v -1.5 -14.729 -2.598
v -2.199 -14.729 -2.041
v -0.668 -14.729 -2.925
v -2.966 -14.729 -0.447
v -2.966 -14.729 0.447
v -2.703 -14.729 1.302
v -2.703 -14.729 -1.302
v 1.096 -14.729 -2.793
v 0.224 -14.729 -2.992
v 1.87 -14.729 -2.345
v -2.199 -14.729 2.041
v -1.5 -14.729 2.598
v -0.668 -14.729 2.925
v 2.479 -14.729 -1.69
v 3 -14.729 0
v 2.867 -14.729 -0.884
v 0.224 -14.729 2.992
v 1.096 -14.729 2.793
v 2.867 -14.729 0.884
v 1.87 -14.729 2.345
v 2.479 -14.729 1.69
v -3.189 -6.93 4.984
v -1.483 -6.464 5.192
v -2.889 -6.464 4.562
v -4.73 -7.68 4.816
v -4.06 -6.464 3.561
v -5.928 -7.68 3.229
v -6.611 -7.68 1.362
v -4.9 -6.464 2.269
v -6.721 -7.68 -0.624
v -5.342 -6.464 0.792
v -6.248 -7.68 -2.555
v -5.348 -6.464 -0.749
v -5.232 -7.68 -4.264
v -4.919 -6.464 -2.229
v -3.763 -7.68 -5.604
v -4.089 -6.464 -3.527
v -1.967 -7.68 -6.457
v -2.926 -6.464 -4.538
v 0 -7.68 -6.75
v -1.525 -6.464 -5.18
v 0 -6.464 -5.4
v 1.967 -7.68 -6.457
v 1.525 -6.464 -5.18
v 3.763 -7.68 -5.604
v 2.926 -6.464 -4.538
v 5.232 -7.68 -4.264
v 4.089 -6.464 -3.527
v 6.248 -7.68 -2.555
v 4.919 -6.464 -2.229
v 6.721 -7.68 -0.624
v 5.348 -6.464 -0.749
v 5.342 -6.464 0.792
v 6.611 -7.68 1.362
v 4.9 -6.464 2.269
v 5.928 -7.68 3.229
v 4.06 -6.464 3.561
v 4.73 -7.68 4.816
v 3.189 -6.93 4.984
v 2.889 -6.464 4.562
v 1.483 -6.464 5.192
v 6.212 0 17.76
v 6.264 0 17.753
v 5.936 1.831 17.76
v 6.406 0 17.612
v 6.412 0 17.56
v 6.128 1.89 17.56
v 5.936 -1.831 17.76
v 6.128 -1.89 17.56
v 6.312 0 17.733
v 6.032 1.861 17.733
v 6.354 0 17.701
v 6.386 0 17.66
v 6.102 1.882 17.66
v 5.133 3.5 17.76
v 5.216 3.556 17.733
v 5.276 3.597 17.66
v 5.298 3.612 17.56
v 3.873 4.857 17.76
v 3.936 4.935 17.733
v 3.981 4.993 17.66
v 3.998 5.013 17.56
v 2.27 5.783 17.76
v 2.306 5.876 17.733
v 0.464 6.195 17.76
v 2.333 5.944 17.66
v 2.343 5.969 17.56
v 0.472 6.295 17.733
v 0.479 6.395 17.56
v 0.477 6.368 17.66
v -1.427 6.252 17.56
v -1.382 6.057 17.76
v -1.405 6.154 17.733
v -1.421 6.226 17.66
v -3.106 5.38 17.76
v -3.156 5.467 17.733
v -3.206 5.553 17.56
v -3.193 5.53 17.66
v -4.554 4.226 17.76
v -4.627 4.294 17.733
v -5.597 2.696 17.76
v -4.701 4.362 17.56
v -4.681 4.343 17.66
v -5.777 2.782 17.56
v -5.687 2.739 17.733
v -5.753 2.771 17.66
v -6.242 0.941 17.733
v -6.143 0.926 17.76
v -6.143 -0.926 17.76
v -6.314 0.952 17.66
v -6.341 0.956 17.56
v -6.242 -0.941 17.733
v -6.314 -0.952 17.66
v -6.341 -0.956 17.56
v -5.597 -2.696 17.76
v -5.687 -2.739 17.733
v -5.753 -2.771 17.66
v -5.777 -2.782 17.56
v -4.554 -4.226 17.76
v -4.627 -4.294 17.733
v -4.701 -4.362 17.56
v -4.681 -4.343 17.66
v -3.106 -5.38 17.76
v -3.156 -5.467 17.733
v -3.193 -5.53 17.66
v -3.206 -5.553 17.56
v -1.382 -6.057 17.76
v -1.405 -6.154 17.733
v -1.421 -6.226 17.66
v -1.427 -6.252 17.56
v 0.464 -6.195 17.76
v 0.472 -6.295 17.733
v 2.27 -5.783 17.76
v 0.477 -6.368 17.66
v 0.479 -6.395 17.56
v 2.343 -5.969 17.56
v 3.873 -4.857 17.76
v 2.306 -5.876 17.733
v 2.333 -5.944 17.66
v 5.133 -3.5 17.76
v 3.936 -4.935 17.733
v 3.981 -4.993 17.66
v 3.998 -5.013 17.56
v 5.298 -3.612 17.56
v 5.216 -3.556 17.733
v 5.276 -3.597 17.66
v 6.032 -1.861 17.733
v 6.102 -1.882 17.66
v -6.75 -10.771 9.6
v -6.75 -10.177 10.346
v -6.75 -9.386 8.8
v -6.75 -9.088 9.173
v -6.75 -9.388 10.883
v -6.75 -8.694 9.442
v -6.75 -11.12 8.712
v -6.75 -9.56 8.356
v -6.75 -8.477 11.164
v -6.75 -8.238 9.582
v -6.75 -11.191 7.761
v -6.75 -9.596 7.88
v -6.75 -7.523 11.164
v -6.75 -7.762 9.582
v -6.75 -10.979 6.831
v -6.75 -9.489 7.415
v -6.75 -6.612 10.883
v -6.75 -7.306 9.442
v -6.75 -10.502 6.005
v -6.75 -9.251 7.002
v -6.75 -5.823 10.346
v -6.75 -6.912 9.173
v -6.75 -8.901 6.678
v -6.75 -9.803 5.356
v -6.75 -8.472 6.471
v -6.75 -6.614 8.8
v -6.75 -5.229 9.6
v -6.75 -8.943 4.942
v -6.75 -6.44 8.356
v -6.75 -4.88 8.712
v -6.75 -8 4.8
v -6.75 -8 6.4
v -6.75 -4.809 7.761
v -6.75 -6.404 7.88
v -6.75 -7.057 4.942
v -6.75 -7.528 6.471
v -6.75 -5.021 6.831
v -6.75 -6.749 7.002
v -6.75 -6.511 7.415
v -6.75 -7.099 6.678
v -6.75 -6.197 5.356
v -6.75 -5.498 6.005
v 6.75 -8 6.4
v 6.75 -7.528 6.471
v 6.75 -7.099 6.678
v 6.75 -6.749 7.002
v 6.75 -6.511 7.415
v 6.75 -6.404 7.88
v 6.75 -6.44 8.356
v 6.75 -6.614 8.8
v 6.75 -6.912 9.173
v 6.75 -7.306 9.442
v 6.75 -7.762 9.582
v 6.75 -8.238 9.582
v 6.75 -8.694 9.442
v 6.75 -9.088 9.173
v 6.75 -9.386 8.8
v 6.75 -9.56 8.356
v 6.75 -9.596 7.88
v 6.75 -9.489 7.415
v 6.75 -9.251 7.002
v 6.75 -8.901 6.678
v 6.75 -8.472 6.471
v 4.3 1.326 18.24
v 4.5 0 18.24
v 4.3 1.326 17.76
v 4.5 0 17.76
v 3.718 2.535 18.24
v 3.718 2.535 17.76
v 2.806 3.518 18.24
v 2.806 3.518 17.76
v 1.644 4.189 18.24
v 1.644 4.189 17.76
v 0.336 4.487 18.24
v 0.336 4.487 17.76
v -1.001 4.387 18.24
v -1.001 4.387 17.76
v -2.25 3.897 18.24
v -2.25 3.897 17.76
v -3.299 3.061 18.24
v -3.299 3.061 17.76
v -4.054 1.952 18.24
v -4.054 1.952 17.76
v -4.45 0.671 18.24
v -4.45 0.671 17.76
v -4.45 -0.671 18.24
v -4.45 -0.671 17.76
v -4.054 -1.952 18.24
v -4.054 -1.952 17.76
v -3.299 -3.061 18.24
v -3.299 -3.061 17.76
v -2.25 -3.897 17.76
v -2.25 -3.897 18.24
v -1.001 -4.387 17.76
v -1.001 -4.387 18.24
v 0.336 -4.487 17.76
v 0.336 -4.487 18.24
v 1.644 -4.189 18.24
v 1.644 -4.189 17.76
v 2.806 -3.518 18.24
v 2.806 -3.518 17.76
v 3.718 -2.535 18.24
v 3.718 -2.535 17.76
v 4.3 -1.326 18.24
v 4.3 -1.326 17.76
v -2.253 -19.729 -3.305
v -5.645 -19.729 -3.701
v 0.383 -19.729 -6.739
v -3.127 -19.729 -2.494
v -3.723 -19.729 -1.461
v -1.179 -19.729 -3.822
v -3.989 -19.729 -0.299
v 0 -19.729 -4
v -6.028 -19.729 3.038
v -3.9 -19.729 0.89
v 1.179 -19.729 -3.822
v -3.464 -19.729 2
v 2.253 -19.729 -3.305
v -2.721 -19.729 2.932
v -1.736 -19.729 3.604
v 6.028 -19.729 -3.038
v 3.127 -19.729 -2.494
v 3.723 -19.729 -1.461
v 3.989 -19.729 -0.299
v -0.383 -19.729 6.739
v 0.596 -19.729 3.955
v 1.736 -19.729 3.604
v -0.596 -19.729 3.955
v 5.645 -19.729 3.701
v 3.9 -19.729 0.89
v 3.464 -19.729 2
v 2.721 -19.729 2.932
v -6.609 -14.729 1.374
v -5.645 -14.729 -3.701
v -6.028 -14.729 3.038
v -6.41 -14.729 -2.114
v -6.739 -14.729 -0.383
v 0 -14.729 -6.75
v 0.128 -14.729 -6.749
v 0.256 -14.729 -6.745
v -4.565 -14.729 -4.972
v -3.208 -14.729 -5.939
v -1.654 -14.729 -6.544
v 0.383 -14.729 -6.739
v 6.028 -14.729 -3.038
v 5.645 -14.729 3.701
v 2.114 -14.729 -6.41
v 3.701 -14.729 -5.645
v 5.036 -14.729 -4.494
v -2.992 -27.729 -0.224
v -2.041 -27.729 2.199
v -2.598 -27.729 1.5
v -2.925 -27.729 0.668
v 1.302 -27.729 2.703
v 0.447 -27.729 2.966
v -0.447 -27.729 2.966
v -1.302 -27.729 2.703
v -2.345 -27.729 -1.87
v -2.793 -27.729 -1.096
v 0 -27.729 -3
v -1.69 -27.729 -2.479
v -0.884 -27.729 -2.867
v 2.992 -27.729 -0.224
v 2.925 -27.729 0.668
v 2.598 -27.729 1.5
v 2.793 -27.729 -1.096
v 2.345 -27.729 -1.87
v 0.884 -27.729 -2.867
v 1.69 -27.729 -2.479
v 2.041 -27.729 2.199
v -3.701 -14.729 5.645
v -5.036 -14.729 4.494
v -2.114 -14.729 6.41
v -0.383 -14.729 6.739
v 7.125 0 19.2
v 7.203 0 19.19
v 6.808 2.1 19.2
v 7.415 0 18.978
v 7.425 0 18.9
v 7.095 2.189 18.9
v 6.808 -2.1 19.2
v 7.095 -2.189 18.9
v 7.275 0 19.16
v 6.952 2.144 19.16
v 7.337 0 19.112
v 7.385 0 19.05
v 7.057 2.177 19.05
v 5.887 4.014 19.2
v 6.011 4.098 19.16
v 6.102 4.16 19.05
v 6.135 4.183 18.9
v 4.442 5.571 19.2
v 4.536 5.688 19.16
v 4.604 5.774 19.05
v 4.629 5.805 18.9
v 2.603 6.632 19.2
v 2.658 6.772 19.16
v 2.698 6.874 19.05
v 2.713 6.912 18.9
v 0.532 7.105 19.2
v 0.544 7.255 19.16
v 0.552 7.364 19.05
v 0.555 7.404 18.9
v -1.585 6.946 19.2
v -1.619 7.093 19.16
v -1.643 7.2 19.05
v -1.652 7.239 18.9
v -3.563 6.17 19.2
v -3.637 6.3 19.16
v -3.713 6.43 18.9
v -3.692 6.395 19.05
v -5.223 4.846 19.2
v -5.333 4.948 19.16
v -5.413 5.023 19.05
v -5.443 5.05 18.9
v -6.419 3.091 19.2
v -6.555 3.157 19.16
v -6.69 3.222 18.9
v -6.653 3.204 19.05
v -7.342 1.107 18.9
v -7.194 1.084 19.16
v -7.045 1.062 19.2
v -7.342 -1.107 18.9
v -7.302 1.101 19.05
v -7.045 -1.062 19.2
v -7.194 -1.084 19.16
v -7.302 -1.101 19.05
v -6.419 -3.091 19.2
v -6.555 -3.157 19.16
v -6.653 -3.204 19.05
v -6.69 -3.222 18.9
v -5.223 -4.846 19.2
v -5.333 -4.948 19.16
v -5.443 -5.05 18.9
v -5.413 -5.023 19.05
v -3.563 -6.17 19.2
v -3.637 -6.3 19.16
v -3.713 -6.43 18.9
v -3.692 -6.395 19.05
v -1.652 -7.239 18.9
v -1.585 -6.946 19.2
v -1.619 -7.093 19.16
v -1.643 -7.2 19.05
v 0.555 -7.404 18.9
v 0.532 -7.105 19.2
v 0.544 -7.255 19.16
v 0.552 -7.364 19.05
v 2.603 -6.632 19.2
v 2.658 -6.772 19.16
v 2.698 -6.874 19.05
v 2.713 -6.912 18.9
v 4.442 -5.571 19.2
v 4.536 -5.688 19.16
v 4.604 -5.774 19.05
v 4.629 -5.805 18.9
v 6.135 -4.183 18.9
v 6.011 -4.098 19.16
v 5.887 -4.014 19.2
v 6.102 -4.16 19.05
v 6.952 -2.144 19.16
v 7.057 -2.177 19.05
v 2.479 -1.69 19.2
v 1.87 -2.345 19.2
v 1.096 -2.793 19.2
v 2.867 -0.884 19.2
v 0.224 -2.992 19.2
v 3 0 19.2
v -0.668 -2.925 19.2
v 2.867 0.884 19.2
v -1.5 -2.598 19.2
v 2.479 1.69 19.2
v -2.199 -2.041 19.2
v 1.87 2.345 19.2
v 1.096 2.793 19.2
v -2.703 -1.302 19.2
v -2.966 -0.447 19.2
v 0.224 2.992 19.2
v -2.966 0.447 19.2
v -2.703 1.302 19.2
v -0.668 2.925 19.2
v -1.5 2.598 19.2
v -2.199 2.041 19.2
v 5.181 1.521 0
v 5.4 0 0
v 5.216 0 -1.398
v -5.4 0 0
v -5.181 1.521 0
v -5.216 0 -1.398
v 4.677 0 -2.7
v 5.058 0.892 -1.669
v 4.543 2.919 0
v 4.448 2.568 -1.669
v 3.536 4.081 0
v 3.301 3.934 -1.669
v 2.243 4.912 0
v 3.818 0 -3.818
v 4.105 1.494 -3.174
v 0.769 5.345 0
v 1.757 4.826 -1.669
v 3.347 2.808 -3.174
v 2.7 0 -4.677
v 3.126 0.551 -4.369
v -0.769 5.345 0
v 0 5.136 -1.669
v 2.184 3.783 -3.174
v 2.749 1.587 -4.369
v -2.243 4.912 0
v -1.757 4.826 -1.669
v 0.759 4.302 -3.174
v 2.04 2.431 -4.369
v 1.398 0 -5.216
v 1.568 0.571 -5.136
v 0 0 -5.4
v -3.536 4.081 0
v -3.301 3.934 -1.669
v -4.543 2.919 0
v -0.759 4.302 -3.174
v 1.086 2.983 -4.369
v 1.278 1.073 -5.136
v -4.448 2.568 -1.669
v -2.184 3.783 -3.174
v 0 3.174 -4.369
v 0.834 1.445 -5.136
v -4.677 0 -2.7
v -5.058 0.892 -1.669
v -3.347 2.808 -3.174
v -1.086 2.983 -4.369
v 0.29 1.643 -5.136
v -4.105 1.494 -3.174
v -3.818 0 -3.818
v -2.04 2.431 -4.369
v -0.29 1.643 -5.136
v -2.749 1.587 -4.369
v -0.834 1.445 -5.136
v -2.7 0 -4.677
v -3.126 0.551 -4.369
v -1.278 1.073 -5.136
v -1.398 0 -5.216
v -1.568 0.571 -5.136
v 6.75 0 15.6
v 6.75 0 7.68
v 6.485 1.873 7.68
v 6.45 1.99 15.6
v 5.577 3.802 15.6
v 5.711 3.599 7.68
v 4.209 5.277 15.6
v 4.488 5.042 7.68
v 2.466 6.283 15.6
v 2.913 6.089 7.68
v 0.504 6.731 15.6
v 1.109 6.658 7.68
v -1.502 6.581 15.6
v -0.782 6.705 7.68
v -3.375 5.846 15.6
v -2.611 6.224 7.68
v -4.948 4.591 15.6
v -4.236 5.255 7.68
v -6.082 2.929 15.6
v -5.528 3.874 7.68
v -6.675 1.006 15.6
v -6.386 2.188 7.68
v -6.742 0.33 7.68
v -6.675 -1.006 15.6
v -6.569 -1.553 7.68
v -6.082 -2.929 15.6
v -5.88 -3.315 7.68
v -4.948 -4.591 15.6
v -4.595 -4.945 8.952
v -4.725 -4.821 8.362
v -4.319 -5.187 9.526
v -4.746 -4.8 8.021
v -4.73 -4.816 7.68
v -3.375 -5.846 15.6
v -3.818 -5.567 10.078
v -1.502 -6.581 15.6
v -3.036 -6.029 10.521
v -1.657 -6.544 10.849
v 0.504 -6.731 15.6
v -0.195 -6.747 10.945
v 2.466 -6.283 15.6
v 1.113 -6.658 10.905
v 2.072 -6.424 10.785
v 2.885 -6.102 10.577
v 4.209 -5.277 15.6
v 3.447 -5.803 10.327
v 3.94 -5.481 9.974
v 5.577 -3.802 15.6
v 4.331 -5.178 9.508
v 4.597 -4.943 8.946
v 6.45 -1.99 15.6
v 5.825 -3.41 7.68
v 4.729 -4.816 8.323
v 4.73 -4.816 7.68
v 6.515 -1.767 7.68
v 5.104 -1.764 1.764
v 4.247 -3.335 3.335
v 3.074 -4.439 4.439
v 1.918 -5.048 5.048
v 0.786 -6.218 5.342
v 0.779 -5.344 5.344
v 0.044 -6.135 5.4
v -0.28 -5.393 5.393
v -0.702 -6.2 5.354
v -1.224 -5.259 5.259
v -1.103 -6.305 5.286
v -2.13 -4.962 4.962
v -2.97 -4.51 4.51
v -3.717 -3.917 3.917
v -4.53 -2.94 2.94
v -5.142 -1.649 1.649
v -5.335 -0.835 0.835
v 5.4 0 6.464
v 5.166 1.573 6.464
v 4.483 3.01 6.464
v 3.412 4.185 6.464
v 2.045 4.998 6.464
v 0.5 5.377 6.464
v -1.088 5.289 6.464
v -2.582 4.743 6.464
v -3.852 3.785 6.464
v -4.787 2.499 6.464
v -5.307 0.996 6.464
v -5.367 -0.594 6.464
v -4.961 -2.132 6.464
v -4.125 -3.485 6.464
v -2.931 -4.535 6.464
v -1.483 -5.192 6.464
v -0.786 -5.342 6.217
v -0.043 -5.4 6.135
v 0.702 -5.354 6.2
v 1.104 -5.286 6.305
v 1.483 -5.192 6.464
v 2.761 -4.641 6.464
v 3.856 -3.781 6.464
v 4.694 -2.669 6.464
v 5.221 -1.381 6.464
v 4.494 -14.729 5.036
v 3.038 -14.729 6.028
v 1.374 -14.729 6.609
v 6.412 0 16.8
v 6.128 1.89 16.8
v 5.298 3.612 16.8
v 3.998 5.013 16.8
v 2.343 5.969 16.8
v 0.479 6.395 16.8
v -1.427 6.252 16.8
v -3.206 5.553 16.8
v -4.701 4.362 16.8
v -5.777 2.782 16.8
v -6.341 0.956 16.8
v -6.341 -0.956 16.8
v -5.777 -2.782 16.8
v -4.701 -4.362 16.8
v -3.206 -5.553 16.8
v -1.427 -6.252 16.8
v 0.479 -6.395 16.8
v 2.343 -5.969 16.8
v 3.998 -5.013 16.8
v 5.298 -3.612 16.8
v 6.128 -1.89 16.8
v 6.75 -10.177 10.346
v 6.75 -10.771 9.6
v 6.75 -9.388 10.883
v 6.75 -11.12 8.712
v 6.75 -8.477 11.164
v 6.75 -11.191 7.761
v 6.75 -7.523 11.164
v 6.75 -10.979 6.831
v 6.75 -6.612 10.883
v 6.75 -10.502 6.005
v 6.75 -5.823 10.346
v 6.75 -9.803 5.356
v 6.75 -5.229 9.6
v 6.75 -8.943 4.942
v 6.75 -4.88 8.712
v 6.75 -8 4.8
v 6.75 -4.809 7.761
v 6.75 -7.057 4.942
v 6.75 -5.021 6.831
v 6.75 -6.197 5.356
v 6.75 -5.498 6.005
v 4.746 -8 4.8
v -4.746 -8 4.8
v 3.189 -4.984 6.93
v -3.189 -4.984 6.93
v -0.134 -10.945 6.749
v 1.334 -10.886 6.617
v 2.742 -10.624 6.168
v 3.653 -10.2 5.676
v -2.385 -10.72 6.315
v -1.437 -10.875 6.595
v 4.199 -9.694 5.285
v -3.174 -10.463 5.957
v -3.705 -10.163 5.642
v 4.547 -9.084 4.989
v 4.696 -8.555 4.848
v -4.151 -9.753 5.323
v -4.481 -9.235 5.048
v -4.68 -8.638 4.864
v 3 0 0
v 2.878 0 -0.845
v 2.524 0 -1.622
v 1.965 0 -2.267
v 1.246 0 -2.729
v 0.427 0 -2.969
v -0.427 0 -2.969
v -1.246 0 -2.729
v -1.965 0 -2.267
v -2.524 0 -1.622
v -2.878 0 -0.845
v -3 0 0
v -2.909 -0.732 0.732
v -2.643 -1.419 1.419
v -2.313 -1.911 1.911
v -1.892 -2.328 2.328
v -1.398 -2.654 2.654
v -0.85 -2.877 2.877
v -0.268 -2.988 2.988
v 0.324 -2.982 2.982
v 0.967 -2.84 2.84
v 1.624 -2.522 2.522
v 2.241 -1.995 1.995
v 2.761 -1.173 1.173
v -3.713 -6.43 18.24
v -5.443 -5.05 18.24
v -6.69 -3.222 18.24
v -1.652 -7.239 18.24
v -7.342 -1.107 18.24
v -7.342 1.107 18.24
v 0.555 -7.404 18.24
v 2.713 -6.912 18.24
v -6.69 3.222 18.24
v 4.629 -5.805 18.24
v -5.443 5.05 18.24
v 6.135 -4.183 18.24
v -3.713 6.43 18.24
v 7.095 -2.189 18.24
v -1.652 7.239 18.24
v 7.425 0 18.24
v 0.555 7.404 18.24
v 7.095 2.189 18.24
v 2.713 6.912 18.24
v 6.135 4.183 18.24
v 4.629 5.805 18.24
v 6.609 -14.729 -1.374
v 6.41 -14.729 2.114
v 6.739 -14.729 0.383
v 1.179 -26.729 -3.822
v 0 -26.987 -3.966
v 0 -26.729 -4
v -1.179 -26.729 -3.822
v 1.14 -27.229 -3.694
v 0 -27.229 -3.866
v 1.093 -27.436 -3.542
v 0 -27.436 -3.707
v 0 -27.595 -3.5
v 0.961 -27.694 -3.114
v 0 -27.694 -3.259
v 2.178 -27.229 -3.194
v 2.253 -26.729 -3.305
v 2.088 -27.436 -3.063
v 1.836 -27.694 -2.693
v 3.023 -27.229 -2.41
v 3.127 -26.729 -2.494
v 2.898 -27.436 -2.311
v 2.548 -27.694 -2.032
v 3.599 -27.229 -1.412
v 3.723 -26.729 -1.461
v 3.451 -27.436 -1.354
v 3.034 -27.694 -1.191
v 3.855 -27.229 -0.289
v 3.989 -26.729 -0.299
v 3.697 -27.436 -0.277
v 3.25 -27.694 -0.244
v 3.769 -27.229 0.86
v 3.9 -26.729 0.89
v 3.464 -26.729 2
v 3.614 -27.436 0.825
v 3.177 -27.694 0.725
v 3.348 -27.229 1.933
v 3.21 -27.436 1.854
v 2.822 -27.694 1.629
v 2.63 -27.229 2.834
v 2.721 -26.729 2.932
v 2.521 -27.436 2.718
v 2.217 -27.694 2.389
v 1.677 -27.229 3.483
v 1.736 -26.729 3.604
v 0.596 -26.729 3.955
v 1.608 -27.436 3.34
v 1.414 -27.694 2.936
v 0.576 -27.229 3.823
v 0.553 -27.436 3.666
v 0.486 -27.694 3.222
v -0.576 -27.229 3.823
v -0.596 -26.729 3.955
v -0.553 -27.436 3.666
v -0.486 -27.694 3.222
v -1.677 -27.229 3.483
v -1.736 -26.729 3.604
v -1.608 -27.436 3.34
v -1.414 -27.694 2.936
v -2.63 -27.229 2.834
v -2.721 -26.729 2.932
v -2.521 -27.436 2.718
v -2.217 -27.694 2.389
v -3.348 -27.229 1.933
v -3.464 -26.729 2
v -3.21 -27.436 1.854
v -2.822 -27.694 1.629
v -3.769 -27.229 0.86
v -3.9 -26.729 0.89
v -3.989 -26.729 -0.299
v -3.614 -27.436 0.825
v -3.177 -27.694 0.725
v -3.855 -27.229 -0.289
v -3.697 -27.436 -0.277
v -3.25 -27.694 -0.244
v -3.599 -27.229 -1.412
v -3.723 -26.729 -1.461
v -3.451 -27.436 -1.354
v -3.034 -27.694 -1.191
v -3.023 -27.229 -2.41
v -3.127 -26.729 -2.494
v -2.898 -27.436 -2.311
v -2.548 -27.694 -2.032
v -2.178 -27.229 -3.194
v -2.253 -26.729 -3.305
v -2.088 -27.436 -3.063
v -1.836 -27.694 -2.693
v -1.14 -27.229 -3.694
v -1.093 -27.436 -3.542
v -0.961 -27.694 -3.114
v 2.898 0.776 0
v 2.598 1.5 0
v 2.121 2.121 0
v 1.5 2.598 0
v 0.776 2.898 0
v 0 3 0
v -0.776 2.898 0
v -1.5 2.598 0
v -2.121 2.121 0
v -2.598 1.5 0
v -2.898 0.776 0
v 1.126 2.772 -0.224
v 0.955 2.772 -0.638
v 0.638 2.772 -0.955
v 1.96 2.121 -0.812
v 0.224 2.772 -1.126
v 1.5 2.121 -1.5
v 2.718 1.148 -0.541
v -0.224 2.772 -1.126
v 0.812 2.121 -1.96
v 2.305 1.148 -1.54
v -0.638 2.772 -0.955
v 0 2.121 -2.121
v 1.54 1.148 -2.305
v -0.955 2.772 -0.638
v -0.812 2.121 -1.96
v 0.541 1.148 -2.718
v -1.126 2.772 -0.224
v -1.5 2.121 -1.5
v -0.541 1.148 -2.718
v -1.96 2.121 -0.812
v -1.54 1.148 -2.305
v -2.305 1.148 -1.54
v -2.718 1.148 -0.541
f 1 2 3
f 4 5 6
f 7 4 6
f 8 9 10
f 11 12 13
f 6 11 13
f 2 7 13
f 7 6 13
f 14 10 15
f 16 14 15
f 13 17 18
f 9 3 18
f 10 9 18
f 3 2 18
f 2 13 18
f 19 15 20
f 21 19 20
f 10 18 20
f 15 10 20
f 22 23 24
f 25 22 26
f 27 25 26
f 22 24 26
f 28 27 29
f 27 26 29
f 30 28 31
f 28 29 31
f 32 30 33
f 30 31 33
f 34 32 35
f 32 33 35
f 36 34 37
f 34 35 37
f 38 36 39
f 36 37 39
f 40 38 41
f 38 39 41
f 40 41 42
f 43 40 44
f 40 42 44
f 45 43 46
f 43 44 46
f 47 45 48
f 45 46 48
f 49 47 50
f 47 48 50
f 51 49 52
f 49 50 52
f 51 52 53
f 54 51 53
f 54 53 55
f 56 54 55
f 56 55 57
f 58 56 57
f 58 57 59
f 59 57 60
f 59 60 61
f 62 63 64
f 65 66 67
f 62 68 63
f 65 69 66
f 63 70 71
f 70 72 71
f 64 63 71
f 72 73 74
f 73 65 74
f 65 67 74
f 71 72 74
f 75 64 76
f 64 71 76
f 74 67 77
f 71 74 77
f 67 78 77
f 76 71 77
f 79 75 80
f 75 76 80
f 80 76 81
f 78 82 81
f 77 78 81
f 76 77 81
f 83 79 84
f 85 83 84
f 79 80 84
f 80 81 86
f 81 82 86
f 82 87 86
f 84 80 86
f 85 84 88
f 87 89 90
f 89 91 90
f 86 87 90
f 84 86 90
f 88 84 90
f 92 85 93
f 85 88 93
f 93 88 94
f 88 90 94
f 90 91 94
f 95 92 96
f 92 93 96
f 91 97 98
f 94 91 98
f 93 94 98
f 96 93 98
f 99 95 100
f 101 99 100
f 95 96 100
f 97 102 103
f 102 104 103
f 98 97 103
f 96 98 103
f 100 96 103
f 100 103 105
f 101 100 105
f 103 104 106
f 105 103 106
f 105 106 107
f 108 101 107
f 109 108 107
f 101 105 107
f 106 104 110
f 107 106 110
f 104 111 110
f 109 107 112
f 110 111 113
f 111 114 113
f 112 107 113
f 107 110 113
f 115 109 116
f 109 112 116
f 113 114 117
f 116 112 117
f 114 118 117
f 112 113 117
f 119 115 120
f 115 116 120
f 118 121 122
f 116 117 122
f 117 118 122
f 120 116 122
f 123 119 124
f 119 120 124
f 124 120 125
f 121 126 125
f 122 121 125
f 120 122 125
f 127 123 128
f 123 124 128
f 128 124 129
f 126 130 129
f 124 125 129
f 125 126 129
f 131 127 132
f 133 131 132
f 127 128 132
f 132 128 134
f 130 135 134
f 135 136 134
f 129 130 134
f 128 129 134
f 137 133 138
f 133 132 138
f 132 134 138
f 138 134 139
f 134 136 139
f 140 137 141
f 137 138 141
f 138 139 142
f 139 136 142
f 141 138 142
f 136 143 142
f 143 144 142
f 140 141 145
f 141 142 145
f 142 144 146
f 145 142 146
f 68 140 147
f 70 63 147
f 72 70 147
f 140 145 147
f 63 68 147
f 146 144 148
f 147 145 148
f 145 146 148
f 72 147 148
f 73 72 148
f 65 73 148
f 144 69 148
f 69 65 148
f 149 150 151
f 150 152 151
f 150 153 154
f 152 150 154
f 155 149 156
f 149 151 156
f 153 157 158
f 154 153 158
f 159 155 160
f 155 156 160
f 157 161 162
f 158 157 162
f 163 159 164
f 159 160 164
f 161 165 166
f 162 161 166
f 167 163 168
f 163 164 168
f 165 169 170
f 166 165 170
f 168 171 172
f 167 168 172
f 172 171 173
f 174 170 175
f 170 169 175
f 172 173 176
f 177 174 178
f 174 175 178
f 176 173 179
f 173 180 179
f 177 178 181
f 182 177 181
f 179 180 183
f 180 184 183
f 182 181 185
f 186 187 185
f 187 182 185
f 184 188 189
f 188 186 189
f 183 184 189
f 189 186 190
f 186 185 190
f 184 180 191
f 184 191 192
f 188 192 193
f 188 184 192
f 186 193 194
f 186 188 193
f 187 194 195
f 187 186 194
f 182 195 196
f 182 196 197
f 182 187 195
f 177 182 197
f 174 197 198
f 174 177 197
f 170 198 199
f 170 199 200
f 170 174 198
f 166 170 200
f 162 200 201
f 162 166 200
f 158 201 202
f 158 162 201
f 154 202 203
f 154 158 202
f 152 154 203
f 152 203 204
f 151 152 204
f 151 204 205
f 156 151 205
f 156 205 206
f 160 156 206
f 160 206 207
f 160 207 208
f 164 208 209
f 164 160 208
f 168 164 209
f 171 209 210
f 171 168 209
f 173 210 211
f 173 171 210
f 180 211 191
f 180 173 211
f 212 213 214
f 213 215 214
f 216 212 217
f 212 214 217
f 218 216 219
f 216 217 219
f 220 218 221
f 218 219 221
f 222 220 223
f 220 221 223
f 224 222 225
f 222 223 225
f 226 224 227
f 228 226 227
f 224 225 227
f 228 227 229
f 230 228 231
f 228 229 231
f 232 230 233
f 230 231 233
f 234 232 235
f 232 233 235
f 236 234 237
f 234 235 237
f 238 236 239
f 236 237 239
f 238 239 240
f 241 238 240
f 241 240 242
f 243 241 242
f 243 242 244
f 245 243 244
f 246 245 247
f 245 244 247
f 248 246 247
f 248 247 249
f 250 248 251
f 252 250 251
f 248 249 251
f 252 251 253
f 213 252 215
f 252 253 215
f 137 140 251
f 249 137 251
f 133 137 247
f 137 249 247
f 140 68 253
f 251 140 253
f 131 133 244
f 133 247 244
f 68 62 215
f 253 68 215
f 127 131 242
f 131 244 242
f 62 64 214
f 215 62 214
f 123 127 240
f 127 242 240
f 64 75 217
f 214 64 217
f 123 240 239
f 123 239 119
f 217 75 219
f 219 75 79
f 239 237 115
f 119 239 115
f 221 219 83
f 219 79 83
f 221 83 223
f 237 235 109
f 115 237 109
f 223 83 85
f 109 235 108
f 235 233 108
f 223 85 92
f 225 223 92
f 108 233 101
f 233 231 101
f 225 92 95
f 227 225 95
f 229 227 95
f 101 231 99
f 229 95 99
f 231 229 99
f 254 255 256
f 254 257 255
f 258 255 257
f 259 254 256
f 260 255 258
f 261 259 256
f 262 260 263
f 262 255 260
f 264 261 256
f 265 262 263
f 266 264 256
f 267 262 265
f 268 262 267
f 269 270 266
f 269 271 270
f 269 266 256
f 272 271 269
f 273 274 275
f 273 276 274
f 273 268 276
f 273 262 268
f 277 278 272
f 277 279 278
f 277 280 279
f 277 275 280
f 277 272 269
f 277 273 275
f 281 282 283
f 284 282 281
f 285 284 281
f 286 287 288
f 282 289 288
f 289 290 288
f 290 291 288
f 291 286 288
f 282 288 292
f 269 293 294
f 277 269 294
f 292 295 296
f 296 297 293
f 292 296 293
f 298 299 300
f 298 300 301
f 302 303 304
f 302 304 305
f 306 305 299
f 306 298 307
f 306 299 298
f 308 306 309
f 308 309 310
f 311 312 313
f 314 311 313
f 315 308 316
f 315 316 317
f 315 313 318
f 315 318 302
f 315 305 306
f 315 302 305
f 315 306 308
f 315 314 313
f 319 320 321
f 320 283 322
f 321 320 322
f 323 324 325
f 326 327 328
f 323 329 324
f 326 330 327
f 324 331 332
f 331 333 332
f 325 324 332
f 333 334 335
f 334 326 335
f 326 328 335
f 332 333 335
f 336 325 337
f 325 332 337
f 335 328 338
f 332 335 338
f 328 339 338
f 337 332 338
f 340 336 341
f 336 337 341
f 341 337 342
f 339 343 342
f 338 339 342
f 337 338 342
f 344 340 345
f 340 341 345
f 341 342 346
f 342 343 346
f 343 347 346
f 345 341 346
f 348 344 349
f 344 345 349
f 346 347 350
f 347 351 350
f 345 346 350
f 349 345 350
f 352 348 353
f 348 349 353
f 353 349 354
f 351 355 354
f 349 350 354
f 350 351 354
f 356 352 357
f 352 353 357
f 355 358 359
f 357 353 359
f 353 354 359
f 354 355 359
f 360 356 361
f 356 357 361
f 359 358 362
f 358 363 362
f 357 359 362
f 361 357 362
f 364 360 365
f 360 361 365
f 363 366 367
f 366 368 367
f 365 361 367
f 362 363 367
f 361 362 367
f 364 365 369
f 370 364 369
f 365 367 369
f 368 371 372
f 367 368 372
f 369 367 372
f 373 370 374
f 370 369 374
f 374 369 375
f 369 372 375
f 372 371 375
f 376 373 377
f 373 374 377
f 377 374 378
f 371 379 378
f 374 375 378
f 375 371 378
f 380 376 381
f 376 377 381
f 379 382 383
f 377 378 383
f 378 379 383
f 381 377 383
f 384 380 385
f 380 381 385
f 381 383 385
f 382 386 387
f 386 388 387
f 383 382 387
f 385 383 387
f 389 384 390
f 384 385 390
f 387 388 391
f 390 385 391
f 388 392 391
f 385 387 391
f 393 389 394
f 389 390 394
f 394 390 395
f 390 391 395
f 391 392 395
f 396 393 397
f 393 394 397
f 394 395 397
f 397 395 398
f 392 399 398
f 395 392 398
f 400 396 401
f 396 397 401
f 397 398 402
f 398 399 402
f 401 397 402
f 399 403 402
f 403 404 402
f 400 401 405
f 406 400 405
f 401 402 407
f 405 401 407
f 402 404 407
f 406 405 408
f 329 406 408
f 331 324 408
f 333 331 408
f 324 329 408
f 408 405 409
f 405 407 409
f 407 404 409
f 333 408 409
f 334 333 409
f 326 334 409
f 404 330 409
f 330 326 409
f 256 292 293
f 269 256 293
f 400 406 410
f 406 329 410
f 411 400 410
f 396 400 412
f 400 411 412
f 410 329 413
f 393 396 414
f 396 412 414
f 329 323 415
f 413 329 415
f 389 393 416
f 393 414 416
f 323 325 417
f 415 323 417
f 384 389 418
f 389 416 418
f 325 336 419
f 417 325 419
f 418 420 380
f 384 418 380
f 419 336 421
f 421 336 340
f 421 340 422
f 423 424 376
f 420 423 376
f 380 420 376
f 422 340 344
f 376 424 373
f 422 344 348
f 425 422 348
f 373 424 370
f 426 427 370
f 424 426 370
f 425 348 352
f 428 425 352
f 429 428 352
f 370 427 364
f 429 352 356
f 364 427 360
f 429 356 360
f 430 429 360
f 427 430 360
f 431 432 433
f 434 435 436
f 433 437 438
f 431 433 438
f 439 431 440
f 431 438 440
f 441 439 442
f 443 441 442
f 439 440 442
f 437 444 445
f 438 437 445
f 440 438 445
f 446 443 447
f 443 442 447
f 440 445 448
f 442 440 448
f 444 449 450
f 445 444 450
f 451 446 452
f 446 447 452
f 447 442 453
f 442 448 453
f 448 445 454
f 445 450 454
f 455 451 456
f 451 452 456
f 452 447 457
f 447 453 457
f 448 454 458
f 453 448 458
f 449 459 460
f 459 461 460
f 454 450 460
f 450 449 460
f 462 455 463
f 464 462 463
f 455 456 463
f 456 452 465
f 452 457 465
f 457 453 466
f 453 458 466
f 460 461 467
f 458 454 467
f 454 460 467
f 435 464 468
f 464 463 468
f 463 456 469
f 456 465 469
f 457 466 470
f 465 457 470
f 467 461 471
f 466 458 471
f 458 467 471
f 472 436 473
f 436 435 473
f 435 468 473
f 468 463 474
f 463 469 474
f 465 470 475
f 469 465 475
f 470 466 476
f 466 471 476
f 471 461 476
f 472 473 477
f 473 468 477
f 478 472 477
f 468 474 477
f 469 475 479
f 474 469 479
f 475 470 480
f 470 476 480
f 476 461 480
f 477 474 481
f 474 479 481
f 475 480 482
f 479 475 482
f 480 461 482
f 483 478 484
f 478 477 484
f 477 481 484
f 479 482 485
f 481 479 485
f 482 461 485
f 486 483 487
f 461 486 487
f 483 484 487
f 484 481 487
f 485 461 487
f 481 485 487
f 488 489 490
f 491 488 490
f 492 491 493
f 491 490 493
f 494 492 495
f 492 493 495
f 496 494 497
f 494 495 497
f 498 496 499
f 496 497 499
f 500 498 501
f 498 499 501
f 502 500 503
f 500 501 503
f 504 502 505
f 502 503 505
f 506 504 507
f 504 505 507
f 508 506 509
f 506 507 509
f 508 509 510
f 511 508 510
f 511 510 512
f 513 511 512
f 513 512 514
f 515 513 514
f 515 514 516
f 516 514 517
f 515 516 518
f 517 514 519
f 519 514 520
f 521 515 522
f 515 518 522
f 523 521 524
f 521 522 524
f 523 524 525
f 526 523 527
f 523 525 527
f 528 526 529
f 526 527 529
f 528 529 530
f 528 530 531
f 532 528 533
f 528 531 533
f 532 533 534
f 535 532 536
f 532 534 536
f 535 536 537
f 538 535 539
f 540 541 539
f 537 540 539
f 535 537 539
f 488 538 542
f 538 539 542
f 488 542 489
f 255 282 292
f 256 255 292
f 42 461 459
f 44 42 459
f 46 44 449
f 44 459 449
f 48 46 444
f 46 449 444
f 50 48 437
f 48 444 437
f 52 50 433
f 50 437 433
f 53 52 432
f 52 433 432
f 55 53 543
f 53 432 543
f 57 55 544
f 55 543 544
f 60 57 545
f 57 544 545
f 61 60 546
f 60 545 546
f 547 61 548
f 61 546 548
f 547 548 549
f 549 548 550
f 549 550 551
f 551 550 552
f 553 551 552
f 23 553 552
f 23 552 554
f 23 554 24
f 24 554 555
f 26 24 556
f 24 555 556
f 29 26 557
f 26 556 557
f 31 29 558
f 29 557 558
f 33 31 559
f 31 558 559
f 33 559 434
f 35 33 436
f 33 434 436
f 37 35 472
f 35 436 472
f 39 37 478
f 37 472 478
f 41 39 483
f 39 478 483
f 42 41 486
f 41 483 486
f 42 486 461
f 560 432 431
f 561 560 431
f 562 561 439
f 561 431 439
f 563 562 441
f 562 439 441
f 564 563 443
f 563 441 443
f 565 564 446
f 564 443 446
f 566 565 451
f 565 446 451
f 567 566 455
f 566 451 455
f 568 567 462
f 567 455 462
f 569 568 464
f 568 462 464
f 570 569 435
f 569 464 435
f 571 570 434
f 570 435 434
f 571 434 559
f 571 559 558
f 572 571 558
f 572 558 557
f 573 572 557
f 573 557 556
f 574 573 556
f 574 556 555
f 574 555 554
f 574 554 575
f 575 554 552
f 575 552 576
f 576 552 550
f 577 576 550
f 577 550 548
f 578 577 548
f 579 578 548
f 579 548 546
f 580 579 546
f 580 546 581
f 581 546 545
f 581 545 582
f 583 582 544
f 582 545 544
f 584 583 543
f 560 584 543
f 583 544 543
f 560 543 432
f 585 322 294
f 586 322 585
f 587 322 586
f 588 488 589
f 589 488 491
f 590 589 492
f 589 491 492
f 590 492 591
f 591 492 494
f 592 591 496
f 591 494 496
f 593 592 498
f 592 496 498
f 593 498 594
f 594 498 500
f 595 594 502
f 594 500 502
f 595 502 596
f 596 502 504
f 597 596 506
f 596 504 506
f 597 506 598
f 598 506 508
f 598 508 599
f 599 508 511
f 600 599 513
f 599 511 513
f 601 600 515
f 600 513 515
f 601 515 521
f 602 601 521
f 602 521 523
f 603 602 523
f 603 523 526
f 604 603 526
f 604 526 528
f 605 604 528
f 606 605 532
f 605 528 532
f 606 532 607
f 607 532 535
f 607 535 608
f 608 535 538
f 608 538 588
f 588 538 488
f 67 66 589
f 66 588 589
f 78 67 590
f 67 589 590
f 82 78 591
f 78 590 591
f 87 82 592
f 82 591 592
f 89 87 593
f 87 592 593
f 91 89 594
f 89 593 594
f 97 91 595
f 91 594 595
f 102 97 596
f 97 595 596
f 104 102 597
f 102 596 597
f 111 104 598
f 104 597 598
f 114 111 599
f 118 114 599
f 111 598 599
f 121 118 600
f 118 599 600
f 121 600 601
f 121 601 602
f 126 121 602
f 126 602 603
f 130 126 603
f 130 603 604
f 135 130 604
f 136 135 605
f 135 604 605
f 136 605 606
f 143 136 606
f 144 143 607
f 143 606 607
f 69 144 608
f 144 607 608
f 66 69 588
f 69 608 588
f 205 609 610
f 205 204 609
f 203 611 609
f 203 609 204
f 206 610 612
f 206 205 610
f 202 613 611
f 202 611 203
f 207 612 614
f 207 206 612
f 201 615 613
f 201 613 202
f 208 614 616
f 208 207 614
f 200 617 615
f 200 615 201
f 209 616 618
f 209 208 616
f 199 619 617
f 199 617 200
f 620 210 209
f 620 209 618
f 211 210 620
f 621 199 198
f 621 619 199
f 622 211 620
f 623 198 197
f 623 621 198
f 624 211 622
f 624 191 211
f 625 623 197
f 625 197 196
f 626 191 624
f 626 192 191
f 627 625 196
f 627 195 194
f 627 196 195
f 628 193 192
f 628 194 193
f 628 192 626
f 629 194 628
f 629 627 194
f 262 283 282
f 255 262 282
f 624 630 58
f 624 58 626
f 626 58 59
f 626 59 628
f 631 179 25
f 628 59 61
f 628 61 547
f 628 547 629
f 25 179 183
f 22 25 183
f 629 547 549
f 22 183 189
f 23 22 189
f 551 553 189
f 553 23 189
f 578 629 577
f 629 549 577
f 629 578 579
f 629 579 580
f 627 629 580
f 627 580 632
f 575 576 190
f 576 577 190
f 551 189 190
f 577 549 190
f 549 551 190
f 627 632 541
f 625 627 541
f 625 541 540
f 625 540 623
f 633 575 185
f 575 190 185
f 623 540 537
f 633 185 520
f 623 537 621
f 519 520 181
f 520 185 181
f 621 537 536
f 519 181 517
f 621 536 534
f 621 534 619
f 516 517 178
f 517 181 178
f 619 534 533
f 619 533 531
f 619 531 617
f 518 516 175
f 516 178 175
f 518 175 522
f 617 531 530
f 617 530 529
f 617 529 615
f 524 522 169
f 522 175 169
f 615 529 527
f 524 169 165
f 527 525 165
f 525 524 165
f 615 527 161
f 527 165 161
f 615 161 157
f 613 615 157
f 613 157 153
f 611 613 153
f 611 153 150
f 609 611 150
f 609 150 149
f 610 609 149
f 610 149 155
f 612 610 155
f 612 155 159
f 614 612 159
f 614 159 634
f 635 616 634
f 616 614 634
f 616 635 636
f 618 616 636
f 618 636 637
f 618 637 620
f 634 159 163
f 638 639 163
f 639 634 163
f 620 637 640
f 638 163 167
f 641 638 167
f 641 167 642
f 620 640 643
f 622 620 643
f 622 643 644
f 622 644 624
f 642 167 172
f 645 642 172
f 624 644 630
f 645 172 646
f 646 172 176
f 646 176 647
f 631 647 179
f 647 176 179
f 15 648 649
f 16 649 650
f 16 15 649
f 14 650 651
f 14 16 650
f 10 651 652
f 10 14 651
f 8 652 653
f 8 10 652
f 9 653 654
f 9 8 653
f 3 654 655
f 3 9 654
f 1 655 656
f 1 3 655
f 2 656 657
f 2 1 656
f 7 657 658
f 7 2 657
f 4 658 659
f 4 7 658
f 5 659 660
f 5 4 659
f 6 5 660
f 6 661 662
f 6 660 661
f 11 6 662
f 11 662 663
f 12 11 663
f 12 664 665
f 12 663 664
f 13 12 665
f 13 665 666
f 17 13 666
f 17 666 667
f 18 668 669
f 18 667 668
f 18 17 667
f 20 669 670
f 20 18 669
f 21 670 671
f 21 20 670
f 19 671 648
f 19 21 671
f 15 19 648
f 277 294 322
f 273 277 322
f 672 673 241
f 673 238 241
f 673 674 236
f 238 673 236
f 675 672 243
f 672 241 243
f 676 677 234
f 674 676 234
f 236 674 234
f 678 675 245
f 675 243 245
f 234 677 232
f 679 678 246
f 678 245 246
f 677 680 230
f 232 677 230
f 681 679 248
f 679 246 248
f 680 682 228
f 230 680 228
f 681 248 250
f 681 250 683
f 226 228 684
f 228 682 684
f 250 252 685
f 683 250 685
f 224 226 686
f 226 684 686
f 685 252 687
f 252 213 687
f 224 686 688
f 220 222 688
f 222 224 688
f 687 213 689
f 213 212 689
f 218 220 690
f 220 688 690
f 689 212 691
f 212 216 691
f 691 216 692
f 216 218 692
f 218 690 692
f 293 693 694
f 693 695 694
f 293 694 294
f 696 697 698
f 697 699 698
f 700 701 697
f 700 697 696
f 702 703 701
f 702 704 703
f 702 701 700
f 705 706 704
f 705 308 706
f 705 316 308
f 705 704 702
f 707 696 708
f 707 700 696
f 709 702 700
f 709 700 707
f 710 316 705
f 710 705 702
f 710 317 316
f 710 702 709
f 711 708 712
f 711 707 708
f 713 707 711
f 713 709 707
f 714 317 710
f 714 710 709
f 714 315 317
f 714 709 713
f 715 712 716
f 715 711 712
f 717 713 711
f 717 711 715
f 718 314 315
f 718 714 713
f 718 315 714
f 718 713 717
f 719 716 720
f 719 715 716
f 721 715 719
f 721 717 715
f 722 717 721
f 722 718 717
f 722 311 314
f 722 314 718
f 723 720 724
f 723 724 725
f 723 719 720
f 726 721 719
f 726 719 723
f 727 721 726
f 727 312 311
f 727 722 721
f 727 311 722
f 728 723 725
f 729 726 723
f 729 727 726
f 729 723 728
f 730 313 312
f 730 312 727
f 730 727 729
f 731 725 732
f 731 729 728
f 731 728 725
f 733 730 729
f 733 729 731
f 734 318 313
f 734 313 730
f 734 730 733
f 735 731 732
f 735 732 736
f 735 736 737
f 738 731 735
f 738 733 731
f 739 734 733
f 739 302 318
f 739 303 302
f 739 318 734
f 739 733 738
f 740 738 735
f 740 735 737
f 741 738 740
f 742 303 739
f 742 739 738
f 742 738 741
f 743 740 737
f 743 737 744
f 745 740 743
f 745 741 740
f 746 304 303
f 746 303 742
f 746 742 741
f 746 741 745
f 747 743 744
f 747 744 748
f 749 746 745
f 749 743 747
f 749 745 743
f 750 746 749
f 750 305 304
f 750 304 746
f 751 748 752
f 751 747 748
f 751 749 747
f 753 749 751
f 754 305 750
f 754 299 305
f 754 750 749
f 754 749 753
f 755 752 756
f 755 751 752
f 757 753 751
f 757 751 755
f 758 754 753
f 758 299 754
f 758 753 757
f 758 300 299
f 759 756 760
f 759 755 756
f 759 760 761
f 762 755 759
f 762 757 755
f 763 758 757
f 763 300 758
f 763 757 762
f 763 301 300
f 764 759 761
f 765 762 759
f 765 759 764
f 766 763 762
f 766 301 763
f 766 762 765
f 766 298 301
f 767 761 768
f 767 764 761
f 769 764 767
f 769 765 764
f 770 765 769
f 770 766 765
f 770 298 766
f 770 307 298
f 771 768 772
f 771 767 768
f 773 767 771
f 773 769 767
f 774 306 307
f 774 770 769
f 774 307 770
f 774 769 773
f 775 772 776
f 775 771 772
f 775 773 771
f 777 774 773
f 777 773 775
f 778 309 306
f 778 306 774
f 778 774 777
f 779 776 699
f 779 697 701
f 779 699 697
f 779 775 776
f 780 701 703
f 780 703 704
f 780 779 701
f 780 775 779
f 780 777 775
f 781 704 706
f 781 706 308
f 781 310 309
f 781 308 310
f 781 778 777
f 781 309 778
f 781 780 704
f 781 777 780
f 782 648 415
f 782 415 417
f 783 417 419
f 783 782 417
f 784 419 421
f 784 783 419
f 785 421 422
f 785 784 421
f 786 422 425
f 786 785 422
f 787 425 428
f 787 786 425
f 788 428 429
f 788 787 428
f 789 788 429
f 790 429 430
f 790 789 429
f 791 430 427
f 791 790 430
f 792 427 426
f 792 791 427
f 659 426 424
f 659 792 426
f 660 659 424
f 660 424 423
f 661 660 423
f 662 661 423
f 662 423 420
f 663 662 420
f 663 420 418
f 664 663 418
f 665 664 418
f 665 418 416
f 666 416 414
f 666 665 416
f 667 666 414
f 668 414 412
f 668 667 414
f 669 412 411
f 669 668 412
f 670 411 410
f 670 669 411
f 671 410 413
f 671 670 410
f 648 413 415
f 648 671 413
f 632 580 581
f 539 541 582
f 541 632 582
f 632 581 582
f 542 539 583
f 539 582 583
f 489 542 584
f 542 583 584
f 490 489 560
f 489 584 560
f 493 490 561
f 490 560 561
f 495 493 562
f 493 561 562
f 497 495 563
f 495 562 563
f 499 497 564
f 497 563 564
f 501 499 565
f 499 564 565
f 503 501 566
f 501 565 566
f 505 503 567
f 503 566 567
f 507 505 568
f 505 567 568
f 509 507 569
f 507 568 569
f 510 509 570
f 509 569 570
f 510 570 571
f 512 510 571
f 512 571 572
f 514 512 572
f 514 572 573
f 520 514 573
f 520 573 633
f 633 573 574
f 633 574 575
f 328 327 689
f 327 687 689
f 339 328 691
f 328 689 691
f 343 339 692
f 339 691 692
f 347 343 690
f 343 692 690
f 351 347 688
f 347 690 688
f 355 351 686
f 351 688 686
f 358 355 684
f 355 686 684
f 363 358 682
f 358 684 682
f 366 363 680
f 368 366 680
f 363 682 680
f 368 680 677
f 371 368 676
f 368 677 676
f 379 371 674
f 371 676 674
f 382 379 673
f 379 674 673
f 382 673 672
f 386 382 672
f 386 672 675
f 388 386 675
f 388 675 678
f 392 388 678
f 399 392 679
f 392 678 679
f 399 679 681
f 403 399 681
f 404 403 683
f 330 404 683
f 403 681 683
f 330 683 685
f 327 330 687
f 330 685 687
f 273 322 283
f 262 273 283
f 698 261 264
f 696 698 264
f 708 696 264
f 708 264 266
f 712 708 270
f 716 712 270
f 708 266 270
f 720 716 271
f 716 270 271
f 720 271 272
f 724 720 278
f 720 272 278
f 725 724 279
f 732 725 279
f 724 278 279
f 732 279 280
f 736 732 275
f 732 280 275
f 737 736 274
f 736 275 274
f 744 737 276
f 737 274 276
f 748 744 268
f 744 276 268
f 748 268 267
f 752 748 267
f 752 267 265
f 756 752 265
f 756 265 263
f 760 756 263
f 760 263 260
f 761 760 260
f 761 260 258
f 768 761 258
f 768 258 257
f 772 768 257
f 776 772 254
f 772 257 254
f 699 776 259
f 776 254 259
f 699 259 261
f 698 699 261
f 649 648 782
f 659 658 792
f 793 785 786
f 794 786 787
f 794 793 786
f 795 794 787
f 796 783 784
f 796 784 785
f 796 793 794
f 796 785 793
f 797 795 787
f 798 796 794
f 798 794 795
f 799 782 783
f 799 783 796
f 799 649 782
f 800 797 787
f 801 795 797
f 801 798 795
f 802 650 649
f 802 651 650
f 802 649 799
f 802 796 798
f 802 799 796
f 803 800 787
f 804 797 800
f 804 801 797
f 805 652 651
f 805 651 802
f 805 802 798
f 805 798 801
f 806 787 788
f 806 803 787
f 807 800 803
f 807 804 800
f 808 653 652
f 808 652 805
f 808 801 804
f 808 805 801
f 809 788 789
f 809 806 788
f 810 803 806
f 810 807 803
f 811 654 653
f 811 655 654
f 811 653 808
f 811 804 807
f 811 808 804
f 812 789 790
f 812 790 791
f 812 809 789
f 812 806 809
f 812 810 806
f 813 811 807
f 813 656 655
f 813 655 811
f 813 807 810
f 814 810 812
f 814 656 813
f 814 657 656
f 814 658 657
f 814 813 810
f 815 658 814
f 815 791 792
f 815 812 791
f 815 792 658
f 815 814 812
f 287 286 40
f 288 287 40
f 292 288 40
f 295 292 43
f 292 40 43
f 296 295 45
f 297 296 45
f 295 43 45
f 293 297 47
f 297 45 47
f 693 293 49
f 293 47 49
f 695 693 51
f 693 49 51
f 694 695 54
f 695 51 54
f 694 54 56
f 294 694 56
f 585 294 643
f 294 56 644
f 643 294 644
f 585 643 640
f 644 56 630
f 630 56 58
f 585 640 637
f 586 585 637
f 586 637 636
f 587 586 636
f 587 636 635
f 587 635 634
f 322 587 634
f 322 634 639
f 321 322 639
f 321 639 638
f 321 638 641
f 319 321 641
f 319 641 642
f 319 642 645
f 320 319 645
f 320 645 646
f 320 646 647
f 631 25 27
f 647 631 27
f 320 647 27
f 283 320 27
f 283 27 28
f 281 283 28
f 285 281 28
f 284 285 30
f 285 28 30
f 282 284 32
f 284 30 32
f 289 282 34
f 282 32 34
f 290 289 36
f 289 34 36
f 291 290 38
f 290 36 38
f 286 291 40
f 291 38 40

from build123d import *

# Parameters (mm, degrees)
SKETCH_3_R               = 3
CUT_EXTRUDE_1_DEPTH      = 19.2
EXTRUDE_1_DEPTH          = 6.75
EXTRUDE_1_DEPTH_BACK     = 6.75
SKETCH_5_R               = 3.2
CUT_EXTRUDE_2_DEPTH      = 6.75
CUT_EXTRUDE_2_DEPTH_BACK = 6.75
SKETCH_6_R               = 1.6
EXTRUDE_2_DEPTH          = 5
SKETCH_8_R               = 4
EXTRUDE_3_DEPTH          = 8
FILLET_1_R               = 1


with BuildPart() as part:
    # 草图1 → 旋转1 (revolve)
    with BuildSketch(Plane(origin=(0, 0, 0), x_dir=(0, 0, -1), z_dir=(1, 0, 0))):
        with BuildLine():
            Line((-19.2, 0), (-19.2, 7.125))
            ThreePointArc((-19.2, 7.125), (-19.112132034, 7.337132034), (-18.9, 7.425))
            Line((-18.9, 7.425), (-18.24, 7.425))
            Line((-18.24, 7.425), (-18.24, 4.5))
            Line((-18.24, 4.5), (-17.76, 4.5))
            Line((-17.76, 4.5), (-17.76, 6.2125))
            ThreePointArc((-17.76, 6.2125), (-17.701421356, 6.353921356), (-17.56, 6.4125))
            Line((-17.56, 6.4125), (-16.8, 6.4125))
            Line((-16.8, 6.4125), (-15.6, 6.75))
            Line((-15.6, 6.75), (-7.68, 6.75))
            Line((-7.68, 6.75), (-6.46445454, 5.4))
            Line((-6.46445454, 5.4), (0, 5.4))
            ThreePointArc((0, 5.4), (3.818376618, 3.818376618), (5.4, 0))
            Line((5.4, 0), (-19.2, 0))
        make_face()
    revolve(axis=Axis((0, 0, -5.4), (0, 0, 1)))

    # 草图2 → 旋转2 (revolve)
    with BuildSketch(Plane(origin=(0, 0, 0), x_dir=(0, 0, -1), z_dir=(1, 0, 0))):
        Polygon((-6.75, -14.728504785), (-6.75, -7.68), (-5.4, -6.46445454), (-5.4, 0), (0, 0), (0, -14.728504785), align=None)
    revolve(axis=Axis((0, 0, 0), (0, -1, 0)))

    # 草图3 → 切除-拉伸1 (cut)
    with BuildSketch(Plane.XY):
        Circle(SKETCH_3_R)
    extrude(amount=CUT_EXTRUDE_1_DEPTH, mode=Mode.SUBTRACT)

    # 草图5 → 凸台-拉伸1 (add, two sides: drawn at the far end of the back side and taken through both)
    with BuildSketch(Plane(origin=(0, 0, 0), x_dir=(0, 0, -1), z_dir=(1, 0, 0)).offset(-EXTRUDE_1_DEPTH_BACK)):
        with Locations((-8, -8)):
            Circle(SKETCH_5_R)
    extrude(amount=EXTRUDE_1_DEPTH + EXTRUDE_1_DEPTH_BACK)

    # 草图6 → 切除-拉伸2 (cut, two sides: drawn at the far end of the back side and taken through both)
    with BuildSketch(Plane(origin=(0, 0, 0), x_dir=(0, 0, -1), z_dir=(1, 0, 0)).offset(-CUT_EXTRUDE_2_DEPTH_BACK)):
        with Locations((-8, -8)):
            Circle(SKETCH_6_R)
    extrude(amount=CUT_EXTRUDE_2_DEPTH + CUT_EXTRUDE_2_DEPTH_BACK, mode=Mode.SUBTRACT)

    # 草图4 → 切除-旋转1 (revolve, cut)
    with BuildSketch(Plane(origin=(0, 0, 0), x_dir=(0, 0, -1), z_dir=(1, 0, 0))):
        with BuildLine():
            Line((3, 0), (3, -39.2))
            Line((3, -39.2), (0, -39.2))
            Line((0, -39.2), (0, 3))
            ThreePointArc((0, 3), (2.121320344, 2.121320344), (3, 0))
        make_face()
    revolve(axis=Axis((0, -19.2, 0), (0, 1, 0)), mode=Mode.SUBTRACT)

    # 草图7 → 凸台-拉伸2 (add)
    with BuildSketch(Plane.XZ.offset(14.728504785)):
        Polygon((-5.644667133, -3.701382574), (0.383157772, -6.73911642), (6.027824905, -3.037733846), (5.644667133, 3.701382574), (-0.383157772, 6.73911642), (-6.027824905, 3.037733846), align=None)
    extrude(amount=EXTRUDE_2_DEPTH)

    # 草图8 → 凸台-拉伸3 (add)
    with BuildSketch(Plane.XZ.offset(19.728504785)):
        Circle(SKETCH_8_R)
    extrude(amount=EXTRUDE_3_DEPTH)

    # 圆角1
    fillet_1_edges = [part.edges().sort_by_distance(p)[0] for p in [
        (-4, -27.728504785, 0),
    ]]
    fillet(fillet_1_edges, radius=FILLET_1_R)


solid = part.part
